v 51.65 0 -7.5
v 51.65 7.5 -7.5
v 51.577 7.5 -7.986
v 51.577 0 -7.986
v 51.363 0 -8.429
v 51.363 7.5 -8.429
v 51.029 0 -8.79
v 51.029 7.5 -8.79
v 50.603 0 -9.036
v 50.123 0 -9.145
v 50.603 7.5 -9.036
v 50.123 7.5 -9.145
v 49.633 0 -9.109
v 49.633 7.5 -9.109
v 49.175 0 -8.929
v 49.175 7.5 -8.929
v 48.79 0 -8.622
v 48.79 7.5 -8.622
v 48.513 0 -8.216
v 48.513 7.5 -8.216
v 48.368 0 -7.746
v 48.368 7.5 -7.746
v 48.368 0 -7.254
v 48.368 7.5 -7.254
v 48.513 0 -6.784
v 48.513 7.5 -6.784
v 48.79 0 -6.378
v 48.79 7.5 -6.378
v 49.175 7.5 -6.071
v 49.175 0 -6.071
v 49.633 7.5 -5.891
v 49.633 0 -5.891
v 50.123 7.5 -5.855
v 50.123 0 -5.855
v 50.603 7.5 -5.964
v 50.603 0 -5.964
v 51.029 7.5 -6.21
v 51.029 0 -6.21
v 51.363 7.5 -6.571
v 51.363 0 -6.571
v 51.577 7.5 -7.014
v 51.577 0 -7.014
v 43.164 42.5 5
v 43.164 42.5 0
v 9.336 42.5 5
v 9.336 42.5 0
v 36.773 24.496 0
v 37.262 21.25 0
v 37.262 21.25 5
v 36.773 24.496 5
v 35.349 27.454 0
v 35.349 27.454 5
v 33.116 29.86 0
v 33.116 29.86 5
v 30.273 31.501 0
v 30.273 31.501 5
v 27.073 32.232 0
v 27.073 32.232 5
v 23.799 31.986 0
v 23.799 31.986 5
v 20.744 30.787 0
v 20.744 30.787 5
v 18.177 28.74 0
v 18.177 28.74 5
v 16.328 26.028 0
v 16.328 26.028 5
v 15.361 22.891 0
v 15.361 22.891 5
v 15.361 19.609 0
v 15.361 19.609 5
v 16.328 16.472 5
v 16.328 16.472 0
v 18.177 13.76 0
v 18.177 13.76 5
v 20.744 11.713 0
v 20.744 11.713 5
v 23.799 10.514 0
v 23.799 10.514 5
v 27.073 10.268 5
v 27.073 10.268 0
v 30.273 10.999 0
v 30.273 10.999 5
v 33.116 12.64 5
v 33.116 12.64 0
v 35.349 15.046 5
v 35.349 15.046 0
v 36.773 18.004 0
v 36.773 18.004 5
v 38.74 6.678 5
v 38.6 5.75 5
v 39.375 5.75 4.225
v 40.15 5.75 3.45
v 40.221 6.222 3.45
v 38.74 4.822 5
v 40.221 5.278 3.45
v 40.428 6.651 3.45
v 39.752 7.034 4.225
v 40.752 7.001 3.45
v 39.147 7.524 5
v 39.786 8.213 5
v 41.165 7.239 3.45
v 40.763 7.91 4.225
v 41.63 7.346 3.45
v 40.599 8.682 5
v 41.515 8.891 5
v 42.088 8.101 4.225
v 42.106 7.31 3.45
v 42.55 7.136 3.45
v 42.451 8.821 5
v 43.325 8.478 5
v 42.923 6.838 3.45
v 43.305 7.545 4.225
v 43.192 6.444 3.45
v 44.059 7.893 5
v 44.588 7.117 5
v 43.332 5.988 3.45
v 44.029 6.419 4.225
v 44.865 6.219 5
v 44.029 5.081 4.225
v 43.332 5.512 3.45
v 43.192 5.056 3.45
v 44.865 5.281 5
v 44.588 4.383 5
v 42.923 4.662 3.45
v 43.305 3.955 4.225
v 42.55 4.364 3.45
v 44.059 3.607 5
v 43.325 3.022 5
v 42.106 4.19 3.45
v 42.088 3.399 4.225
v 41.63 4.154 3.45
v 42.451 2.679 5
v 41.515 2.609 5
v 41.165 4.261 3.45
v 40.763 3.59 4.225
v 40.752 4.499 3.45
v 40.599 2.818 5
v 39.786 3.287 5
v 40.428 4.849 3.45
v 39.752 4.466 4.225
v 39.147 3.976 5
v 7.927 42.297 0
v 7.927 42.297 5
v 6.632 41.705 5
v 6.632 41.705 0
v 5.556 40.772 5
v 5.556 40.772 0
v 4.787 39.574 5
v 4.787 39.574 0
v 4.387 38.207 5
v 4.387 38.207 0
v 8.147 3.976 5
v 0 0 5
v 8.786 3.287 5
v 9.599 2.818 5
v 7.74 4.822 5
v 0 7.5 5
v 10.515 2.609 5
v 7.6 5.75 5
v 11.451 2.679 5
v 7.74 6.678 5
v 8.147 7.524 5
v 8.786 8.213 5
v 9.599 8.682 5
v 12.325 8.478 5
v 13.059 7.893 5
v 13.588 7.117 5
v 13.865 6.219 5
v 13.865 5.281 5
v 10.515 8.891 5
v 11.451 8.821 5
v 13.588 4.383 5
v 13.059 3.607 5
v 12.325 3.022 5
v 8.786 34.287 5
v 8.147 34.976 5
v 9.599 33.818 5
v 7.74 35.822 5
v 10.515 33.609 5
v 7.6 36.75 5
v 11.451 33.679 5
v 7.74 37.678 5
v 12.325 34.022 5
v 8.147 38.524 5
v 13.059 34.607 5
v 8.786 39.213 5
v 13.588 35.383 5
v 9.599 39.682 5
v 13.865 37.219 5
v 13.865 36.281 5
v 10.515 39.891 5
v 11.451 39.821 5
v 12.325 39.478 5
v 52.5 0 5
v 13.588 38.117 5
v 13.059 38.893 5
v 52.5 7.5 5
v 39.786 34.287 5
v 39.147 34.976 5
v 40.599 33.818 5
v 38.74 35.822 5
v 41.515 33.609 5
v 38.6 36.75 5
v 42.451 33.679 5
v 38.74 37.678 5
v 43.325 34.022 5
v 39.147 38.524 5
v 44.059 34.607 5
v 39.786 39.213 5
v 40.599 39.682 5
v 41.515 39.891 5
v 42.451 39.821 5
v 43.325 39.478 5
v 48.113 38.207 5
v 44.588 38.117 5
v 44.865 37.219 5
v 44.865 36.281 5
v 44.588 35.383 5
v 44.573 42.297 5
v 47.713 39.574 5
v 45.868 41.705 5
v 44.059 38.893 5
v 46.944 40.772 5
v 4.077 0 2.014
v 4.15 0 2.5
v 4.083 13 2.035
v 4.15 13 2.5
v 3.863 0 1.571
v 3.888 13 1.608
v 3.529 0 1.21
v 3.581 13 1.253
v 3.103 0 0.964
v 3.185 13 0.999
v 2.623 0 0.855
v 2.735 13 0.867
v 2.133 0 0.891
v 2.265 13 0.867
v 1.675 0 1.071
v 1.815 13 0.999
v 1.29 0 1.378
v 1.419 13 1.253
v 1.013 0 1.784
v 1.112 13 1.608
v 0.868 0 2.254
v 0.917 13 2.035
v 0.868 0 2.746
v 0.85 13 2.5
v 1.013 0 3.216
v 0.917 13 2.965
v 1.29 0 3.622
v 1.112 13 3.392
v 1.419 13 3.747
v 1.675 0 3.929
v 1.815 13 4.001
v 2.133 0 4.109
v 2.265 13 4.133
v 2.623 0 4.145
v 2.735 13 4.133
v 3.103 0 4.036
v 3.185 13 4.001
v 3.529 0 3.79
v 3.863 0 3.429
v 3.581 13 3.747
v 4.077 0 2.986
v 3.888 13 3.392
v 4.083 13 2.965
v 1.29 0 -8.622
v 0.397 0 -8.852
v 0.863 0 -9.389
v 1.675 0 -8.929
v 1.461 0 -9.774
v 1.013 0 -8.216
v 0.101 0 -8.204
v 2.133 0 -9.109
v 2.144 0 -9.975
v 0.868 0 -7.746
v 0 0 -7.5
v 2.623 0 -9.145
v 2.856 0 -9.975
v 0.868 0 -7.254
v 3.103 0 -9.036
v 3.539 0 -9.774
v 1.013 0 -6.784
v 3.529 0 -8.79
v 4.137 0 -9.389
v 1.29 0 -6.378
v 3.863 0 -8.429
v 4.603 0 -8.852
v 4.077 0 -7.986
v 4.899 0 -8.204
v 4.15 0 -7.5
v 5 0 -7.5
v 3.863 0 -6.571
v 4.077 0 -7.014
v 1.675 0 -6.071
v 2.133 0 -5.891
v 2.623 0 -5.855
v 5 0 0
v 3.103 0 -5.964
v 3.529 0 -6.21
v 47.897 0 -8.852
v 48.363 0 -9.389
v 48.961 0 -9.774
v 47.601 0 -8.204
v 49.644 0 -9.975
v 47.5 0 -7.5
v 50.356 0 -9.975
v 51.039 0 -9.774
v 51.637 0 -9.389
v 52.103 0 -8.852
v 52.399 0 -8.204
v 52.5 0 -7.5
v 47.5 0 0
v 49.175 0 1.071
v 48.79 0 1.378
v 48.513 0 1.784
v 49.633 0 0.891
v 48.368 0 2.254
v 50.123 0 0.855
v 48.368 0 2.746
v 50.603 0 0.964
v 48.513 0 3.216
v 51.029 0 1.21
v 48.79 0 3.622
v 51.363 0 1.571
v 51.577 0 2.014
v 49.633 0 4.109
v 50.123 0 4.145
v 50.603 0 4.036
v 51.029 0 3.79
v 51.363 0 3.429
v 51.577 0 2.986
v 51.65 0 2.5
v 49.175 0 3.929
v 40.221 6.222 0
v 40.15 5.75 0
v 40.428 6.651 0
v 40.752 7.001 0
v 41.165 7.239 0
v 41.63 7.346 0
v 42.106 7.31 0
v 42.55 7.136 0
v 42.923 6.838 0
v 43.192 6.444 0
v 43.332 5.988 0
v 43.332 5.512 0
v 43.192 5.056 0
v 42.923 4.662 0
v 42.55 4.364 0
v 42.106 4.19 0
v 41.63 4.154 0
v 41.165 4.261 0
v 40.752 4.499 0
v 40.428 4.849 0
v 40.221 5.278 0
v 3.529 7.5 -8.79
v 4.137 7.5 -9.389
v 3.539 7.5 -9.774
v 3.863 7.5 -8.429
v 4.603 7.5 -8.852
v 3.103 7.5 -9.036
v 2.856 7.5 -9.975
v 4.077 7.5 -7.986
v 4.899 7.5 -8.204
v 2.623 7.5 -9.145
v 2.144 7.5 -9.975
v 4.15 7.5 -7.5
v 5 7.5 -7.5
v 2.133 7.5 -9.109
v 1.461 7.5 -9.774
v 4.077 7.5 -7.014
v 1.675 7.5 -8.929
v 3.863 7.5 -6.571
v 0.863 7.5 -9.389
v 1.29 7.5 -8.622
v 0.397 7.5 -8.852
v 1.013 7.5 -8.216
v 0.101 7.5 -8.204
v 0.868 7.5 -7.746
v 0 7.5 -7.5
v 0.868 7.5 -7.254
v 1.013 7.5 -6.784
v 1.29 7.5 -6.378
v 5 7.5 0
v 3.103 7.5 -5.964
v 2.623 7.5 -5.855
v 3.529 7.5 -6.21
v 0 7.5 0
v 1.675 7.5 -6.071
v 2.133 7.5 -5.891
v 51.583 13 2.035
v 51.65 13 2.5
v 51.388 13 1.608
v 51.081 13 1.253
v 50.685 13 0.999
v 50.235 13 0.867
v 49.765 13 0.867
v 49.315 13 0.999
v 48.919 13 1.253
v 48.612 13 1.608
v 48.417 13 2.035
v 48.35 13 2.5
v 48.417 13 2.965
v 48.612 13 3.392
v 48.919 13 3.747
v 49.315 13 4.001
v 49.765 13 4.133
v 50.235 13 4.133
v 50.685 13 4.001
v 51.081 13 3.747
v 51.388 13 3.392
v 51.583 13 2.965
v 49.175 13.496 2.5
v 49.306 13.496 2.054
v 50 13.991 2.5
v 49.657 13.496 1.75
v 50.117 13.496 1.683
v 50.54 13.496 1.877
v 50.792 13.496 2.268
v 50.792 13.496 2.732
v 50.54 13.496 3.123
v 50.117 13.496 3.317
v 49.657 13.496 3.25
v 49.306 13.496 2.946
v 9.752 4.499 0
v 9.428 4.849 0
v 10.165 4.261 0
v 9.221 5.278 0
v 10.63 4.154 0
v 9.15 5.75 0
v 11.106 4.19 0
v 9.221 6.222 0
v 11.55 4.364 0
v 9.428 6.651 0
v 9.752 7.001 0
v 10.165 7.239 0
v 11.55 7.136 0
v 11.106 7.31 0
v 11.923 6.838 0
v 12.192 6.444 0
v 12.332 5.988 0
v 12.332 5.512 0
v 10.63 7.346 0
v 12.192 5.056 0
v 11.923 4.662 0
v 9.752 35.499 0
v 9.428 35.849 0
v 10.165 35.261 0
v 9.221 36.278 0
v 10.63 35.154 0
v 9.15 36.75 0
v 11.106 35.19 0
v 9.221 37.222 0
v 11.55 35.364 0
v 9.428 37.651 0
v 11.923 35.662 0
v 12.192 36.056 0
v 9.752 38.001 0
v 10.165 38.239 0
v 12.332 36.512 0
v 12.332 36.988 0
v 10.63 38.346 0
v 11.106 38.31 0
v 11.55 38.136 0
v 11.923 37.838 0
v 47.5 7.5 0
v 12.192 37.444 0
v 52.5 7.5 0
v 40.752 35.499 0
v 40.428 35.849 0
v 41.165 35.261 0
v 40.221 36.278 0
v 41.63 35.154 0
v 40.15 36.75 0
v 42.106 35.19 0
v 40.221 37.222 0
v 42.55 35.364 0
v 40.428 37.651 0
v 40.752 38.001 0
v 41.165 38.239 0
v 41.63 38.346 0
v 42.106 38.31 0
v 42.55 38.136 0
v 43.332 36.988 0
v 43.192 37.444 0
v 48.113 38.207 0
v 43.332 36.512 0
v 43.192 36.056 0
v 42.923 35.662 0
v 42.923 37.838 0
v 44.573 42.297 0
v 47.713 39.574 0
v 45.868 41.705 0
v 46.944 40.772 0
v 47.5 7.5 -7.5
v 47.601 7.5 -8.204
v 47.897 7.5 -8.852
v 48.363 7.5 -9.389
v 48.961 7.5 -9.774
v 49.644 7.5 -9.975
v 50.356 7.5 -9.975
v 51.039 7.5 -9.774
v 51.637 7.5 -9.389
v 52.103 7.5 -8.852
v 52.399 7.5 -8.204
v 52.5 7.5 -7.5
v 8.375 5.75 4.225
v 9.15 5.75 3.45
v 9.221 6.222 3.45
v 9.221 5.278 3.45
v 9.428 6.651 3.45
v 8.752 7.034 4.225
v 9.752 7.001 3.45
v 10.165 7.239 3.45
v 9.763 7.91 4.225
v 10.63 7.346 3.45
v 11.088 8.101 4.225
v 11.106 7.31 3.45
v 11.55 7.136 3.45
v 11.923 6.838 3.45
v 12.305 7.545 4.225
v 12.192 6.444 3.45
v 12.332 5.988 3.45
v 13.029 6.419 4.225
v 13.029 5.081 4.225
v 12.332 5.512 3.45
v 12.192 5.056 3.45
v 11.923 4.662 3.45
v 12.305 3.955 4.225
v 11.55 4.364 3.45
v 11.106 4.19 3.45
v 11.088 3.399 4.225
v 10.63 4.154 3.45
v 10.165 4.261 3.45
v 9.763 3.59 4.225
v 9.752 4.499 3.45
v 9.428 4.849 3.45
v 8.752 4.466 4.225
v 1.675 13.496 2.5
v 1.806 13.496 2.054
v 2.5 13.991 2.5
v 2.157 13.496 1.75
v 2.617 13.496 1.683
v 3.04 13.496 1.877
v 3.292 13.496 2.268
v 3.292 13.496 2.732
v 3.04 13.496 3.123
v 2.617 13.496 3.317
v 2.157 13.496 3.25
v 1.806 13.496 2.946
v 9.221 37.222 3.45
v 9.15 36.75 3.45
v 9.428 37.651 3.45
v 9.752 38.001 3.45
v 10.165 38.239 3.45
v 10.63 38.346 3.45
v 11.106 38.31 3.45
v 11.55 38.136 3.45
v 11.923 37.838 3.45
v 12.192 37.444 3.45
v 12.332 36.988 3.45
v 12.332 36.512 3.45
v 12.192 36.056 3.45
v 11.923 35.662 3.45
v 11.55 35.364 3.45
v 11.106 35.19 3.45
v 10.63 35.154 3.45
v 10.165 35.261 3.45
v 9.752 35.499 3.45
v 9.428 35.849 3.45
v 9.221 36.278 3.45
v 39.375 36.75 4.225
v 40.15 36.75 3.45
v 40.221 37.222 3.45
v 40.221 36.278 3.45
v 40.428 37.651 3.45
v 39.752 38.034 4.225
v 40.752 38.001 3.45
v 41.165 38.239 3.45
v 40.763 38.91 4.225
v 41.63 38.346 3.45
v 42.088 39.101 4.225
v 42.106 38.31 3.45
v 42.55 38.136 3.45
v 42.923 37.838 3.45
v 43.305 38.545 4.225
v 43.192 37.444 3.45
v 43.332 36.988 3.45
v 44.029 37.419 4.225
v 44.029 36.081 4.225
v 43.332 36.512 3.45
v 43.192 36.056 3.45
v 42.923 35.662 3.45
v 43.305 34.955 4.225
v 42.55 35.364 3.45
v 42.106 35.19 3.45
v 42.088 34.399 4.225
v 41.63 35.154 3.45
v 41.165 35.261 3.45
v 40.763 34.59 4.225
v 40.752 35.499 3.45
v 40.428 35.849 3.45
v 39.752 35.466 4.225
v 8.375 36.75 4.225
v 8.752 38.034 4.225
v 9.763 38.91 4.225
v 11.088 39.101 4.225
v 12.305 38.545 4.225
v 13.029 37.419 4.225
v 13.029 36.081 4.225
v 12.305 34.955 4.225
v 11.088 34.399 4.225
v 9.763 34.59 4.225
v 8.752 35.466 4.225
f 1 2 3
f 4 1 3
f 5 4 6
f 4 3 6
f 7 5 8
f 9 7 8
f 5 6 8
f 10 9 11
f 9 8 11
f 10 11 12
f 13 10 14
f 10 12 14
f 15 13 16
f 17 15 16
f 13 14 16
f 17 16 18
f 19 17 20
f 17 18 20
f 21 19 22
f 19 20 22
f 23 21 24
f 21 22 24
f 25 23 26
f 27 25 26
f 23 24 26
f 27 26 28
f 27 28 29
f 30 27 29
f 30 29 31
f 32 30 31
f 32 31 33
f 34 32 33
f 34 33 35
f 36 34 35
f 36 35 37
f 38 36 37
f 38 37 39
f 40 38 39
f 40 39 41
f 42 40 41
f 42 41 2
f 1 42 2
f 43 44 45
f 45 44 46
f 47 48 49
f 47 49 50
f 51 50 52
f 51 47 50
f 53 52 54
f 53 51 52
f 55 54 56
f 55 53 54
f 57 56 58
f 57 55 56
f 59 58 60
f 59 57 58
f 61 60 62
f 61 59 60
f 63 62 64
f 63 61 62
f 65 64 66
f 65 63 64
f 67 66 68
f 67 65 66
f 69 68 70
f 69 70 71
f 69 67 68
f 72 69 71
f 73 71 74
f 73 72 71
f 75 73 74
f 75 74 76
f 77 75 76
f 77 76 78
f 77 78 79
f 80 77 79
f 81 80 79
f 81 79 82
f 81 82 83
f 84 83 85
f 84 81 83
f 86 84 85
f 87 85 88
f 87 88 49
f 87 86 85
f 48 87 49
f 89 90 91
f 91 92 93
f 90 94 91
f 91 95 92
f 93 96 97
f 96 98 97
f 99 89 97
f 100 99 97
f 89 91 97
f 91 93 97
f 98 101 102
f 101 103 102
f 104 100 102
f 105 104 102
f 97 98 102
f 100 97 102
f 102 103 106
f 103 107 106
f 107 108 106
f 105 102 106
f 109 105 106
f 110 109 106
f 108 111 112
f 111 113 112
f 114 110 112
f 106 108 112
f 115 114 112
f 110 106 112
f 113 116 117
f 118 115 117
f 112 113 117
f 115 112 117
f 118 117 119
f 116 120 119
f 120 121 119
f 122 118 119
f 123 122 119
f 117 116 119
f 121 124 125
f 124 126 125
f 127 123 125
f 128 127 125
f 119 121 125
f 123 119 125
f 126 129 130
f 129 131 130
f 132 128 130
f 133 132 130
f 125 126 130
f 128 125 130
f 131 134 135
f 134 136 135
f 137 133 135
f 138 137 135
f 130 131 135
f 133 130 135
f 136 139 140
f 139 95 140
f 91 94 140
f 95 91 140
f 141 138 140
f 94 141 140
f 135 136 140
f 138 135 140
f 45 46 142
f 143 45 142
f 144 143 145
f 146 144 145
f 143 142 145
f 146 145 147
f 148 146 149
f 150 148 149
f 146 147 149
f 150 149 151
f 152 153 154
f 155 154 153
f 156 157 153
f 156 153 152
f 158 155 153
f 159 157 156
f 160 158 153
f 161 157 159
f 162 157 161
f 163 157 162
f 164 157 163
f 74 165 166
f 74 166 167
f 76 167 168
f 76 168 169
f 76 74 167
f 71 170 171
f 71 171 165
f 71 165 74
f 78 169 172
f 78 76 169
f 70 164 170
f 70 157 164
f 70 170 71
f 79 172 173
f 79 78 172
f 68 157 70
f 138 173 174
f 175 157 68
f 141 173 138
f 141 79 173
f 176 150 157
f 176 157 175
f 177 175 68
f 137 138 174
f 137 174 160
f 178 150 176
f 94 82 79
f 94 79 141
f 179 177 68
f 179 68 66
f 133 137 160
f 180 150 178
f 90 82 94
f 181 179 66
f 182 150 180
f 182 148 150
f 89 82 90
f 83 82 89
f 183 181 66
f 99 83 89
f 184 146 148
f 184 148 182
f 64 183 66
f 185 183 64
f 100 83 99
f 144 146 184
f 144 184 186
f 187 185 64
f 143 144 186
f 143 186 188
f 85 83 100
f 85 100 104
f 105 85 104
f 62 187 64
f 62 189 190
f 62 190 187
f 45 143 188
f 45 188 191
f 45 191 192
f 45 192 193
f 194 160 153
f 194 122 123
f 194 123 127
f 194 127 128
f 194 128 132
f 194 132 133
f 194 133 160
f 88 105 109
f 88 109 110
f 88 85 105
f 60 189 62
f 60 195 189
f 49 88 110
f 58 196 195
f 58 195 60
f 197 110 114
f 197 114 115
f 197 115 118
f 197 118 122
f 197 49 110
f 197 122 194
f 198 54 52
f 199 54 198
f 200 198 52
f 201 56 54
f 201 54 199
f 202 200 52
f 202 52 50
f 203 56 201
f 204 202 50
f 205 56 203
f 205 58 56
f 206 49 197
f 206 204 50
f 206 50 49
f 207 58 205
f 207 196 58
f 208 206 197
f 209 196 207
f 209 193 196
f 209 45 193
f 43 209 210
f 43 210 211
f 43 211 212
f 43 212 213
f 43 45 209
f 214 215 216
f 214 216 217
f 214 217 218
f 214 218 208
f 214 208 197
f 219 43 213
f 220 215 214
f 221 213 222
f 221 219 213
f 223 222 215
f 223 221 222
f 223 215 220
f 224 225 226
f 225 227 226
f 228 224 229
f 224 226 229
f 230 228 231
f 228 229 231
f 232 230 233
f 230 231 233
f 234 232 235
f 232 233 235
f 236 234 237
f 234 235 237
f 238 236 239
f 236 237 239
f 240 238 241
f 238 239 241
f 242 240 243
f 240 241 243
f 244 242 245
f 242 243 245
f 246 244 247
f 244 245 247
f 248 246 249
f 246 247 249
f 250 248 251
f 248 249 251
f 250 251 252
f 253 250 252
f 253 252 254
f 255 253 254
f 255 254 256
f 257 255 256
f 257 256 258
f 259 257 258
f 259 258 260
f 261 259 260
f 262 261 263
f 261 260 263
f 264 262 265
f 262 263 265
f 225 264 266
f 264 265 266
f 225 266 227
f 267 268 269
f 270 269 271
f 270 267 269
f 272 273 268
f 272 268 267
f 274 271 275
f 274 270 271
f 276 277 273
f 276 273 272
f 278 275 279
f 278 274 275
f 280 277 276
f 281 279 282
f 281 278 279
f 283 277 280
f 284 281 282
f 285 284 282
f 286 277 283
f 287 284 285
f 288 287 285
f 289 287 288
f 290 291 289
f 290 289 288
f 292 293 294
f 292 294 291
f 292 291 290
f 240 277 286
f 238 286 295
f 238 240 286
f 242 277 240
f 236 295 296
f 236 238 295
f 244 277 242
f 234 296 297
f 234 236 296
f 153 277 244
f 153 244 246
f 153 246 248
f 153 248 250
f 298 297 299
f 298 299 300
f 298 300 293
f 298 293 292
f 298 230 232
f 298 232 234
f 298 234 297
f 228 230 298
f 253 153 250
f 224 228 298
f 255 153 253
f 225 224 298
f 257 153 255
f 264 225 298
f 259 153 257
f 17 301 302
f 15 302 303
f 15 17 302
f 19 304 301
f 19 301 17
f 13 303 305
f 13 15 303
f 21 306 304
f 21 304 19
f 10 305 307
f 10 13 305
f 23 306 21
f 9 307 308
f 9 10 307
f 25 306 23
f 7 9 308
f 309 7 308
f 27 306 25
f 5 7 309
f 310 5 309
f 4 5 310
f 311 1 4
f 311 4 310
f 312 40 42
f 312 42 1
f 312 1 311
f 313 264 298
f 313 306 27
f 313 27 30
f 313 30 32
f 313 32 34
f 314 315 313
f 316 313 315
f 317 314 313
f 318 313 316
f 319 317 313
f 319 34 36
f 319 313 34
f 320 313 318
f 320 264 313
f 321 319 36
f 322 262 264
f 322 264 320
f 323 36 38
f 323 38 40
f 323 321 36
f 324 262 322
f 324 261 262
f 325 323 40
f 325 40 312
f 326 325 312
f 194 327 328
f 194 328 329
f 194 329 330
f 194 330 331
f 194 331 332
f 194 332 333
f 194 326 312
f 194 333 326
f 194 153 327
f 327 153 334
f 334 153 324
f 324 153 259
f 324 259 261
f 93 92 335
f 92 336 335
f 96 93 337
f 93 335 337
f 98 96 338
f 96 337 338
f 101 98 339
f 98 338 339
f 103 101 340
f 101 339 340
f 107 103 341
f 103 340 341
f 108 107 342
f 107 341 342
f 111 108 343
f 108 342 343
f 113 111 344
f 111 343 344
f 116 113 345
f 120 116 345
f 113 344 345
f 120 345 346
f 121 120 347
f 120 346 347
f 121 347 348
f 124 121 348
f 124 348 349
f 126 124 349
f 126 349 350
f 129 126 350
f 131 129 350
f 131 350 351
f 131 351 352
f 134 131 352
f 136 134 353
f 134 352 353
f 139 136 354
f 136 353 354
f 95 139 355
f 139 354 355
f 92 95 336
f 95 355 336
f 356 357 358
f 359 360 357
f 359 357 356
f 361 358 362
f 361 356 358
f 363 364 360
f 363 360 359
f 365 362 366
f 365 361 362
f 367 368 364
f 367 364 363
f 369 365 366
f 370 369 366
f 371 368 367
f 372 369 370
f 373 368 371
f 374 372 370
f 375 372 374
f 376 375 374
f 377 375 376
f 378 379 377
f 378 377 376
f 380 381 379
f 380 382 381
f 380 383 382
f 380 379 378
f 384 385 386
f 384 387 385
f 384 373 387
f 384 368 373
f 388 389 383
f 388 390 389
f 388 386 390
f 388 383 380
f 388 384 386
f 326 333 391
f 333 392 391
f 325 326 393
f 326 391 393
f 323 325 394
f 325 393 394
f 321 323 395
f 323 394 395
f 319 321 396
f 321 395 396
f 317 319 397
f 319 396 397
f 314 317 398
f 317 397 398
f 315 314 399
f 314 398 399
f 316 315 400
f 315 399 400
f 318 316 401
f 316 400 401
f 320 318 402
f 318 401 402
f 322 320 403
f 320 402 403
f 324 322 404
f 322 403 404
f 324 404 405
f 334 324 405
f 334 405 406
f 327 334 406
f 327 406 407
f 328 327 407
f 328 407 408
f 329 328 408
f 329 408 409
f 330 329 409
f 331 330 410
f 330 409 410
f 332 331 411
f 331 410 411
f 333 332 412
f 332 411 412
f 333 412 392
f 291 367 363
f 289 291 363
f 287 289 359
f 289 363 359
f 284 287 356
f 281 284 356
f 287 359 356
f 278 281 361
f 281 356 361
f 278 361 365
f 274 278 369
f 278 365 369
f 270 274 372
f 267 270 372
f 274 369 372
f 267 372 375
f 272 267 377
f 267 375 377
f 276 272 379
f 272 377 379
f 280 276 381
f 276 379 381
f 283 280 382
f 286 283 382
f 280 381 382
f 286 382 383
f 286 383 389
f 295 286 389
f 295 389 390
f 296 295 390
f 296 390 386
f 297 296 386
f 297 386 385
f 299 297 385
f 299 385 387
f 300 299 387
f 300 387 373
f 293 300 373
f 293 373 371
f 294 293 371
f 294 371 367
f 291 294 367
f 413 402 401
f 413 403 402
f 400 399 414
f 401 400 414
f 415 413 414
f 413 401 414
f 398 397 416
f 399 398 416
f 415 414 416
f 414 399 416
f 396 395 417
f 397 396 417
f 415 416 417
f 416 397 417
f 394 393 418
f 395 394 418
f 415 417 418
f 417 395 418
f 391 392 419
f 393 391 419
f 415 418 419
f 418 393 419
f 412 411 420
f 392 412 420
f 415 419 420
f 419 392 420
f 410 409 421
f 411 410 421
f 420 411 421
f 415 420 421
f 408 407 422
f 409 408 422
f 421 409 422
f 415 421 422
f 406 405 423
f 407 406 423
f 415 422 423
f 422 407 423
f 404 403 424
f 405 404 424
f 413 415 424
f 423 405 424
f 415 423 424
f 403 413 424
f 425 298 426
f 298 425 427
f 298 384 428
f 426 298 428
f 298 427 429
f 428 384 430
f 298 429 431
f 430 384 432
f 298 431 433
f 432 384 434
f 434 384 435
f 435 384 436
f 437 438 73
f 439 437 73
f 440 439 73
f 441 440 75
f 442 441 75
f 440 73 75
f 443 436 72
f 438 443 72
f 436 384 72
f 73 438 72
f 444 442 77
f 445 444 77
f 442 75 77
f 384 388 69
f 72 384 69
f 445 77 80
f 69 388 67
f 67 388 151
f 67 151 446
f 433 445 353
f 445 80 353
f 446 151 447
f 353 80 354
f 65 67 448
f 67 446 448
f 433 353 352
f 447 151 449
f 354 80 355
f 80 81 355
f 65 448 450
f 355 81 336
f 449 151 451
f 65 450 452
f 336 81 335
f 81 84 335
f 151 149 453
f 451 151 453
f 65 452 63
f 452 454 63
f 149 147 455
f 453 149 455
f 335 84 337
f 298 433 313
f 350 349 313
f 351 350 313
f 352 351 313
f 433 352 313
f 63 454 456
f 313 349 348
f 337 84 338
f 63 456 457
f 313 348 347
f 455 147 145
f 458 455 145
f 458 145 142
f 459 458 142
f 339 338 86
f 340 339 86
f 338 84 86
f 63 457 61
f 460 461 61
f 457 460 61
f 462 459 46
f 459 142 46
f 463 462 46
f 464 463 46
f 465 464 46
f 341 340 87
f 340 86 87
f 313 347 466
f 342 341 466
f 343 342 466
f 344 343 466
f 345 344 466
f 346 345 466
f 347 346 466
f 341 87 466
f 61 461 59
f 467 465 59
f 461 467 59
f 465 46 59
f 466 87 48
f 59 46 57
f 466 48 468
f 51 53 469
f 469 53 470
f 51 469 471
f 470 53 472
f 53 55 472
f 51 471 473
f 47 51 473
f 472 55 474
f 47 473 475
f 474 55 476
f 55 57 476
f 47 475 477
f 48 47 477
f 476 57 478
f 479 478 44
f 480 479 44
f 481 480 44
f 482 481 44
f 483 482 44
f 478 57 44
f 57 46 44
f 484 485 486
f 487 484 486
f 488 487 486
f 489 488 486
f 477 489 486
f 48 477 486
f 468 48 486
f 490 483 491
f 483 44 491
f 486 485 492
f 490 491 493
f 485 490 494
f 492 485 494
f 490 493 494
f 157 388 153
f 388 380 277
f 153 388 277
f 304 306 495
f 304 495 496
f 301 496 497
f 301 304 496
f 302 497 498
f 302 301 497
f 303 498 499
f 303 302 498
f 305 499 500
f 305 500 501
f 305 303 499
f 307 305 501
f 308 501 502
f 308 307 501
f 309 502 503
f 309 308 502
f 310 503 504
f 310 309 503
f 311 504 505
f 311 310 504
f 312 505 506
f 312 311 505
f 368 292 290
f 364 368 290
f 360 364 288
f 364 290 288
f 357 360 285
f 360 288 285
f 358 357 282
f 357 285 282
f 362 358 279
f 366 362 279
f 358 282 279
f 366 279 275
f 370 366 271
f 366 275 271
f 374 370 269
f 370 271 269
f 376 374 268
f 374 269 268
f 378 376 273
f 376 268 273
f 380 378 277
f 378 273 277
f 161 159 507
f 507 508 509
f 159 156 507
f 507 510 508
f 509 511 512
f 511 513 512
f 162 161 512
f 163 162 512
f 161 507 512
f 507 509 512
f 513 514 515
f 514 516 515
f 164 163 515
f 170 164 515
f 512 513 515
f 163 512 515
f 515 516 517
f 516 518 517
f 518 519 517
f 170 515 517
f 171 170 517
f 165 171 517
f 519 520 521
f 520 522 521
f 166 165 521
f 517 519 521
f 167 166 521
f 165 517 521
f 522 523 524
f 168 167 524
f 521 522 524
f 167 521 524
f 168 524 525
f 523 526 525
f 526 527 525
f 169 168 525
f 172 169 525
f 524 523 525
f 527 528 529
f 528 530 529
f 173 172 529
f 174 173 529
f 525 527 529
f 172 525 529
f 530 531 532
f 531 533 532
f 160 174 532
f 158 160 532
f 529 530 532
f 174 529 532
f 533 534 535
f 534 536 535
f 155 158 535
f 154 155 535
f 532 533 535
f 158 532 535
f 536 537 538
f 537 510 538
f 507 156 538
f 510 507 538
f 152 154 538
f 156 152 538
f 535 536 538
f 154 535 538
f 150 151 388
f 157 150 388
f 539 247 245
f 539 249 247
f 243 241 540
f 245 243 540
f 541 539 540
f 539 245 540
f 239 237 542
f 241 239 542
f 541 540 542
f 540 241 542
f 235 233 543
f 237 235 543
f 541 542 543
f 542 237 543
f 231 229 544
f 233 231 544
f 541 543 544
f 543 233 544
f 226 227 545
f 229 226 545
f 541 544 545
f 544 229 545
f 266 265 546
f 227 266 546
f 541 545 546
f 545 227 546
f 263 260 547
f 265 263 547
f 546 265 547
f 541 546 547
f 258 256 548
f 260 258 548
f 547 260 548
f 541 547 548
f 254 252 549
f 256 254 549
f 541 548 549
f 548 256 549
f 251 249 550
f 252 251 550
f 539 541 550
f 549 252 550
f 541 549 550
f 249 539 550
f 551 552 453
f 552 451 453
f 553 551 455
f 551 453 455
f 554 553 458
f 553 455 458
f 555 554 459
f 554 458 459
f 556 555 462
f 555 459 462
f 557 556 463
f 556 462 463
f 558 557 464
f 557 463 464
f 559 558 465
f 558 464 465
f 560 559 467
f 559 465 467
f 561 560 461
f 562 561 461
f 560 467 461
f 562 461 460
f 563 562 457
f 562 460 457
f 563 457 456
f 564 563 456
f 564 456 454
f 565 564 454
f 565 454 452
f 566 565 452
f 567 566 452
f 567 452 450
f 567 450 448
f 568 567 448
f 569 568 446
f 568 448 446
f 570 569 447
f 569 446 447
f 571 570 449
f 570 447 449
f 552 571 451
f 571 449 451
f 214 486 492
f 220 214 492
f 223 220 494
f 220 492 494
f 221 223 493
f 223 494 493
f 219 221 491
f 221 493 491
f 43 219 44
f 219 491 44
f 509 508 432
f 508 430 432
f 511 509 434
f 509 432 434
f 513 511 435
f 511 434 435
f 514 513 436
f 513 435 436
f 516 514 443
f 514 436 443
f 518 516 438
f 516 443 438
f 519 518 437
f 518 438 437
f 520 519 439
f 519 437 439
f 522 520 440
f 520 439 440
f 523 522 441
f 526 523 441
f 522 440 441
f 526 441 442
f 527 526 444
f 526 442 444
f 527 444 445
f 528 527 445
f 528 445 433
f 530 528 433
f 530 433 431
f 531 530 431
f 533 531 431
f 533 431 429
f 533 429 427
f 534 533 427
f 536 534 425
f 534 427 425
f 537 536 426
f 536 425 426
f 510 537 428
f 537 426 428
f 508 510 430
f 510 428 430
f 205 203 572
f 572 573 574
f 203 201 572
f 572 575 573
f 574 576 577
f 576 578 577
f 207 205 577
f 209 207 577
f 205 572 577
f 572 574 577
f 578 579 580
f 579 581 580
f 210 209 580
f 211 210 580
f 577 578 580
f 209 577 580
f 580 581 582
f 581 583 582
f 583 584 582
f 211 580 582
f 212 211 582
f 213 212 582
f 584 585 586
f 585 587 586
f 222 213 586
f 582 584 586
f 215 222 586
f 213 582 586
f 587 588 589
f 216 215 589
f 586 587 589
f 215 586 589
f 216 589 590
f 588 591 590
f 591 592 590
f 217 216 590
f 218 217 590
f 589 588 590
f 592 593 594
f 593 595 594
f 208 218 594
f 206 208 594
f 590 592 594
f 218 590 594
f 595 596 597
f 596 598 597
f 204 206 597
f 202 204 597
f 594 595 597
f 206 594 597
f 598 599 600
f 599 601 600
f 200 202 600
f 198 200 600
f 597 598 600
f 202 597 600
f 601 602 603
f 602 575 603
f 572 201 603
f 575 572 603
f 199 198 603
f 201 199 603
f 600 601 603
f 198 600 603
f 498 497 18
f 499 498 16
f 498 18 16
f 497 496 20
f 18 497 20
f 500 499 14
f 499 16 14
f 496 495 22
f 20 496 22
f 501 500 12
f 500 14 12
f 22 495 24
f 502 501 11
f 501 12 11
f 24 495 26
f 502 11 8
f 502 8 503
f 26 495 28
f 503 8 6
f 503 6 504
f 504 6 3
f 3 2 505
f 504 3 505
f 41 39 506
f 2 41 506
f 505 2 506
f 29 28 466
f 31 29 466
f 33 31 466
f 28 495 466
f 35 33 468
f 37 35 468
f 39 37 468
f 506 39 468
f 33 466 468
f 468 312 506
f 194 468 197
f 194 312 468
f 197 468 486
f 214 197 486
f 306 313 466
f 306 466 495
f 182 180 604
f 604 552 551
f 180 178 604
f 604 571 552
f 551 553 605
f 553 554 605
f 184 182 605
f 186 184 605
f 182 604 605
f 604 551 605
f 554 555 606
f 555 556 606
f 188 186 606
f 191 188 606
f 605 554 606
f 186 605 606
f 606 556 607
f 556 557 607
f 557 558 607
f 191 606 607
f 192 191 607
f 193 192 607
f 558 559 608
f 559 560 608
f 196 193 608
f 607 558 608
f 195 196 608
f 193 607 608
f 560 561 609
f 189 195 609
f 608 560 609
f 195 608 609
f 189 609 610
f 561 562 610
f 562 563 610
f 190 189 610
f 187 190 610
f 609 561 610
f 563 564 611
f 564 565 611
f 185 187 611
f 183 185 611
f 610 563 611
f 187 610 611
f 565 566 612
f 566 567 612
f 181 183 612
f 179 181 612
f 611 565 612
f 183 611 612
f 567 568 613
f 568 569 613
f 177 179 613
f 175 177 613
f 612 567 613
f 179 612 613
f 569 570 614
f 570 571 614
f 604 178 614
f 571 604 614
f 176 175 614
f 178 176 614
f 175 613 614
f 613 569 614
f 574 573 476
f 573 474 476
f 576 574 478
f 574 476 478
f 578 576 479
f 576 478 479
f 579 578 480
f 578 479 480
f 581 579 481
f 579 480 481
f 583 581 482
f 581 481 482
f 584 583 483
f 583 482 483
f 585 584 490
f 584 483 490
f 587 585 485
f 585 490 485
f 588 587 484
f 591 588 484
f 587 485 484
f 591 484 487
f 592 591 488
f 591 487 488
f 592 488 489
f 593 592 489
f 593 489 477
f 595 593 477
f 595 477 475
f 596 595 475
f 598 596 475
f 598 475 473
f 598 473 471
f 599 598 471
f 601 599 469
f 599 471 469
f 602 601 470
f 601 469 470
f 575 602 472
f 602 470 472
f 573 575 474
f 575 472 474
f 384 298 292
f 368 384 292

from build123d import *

# Parameters (mm, degrees)
SKIZZE1_R                                            = 11.0125
AUFSATZ_LINEAR_AUSTRAGEN1_DEPTH                      = 5
AUFSATZ_LINEAR_AUSTRAGEN2_DEPTH                      = 7.5
FORMSENKUNG_F_R_M3_SENKSCHRAUBE_MIT_SCHL_D           = 3.2
FORMSENKUNG_F_R_M3_SENKSCHRAUBE_MIT_SCHL_CSINK_D     = 6.3
FORMSENKUNG_F_R_M3_SENKSCHRAUBE_MIT_SCHL_CSINK_ANGLE = 90
M4_GEWINDEBOHRUNG2_D                                 = 3.3
M4_GEWINDEBOHRUNG2_DEPTH                             = 13
M4_GEWINDEBOHRUNG2_TIP                               = 0.991420021


with BuildPart() as part:
    # Skizze1 → Aufsatz-Linear austragen1 (new body)
    with BuildSketch(Plane.XY):
        with BuildLine():
            Line((52.5, 7.5), (48.11327046, 38.207106781))
            ThreePointArc((48.11327046, 38.207106781), (46.439531698, 41.277269775), (43.163522992, 42.5))
            Line((43.163522992, 42.5), (9.336477008, 42.5))
            ThreePointArc((9.336477008, 42.5), (6.060468302, 41.277269775), (4.38672954, 38.207106781))
            Line((4.38672954, 38.207106781), (0, 7.5))
            Line((0, 7.5), (0, 0))
            Line((0, 0), (52.5, 0))
            Line((52.5, 0), (52.5, 7.5))
        make_face()
        with Locations((26.25, 21.25)):
            Circle(SKIZZE1_R, mode=Mode.SUBTRACT)
    extrude(amount=AUFSATZ_LINEAR_AUSTRAGEN1_DEPTH)

    # Skizze4 → Aufsatz-Linear austragen2 (add)
    with BuildSketch(Plane.XZ):
        with BuildLine():
            Line((52.5, 0), (47.5, 0))
            Line((47.5, 0), (47.5, -7.5))
            ThreePointArc((47.5, -7.5), (50, -10), (52.5, -7.5))
            Line((52.5, -7.5), (52.5, 0))
        make_face()
        with BuildLine():
            Line((0, 0), (5, 0))
            Line((5, 0), (5, -7.5))
            ThreePointArc((5, -7.5), (2.5, -10), (0, -7.5))
            Line((0, -7.5), (0, 0))
        make_face()
    extrude(amount=-AUFSATZ_LINEAR_AUSTRAGEN2_DEPTH)

    # Formsenkung für M3 Senkschraube mit Schlitz/Kreuzschlitz1 (through all)
    with Locations(Plane.XY.offset(5)):
        with Locations((10.75, 36.75), (41.75, 5.75), (10.75, 5.75), (41.75, 36.75)):
            CounterSinkHole(FORMSENKUNG_F_R_M3_SENKSCHRAUBE_MIT_SCHL_D / 2, FORMSENKUNG_F_R_M3_SENKSCHRAUBE_MIT_SCHL_CSINK_D / 2, counter_sink_angle=FORMSENKUNG_F_R_M3_SENKSCHRAUBE_MIT_SCHL_CSINK_ANGLE)

    # M4 Gewindebohrung2
    with Locations(Plane(origin=(0, 0, 0), x_dir=(-1, 0, 0), z_dir=(0, -1, 0))):
        with Locations((-2.5, 7.5), (-50, 7.5), (-50, -2.5), (-2.5, -2.5)):
            Hole(M4_GEWINDEBOHRUNG2_D / 2, depth=M4_GEWINDEBOHRUNG2_DEPTH)
            with Locations((0, 0, -(M4_GEWINDEBOHRUNG2_DEPTH + M4_GEWINDEBOHRUNG2_TIP / 2))):  # 118° drill point
                Cone(0, M4_GEWINDEBOHRUNG2_D / 2, M4_GEWINDEBOHRUNG2_TIP, mode=Mode.SUBTRACT)


solid = part.part
